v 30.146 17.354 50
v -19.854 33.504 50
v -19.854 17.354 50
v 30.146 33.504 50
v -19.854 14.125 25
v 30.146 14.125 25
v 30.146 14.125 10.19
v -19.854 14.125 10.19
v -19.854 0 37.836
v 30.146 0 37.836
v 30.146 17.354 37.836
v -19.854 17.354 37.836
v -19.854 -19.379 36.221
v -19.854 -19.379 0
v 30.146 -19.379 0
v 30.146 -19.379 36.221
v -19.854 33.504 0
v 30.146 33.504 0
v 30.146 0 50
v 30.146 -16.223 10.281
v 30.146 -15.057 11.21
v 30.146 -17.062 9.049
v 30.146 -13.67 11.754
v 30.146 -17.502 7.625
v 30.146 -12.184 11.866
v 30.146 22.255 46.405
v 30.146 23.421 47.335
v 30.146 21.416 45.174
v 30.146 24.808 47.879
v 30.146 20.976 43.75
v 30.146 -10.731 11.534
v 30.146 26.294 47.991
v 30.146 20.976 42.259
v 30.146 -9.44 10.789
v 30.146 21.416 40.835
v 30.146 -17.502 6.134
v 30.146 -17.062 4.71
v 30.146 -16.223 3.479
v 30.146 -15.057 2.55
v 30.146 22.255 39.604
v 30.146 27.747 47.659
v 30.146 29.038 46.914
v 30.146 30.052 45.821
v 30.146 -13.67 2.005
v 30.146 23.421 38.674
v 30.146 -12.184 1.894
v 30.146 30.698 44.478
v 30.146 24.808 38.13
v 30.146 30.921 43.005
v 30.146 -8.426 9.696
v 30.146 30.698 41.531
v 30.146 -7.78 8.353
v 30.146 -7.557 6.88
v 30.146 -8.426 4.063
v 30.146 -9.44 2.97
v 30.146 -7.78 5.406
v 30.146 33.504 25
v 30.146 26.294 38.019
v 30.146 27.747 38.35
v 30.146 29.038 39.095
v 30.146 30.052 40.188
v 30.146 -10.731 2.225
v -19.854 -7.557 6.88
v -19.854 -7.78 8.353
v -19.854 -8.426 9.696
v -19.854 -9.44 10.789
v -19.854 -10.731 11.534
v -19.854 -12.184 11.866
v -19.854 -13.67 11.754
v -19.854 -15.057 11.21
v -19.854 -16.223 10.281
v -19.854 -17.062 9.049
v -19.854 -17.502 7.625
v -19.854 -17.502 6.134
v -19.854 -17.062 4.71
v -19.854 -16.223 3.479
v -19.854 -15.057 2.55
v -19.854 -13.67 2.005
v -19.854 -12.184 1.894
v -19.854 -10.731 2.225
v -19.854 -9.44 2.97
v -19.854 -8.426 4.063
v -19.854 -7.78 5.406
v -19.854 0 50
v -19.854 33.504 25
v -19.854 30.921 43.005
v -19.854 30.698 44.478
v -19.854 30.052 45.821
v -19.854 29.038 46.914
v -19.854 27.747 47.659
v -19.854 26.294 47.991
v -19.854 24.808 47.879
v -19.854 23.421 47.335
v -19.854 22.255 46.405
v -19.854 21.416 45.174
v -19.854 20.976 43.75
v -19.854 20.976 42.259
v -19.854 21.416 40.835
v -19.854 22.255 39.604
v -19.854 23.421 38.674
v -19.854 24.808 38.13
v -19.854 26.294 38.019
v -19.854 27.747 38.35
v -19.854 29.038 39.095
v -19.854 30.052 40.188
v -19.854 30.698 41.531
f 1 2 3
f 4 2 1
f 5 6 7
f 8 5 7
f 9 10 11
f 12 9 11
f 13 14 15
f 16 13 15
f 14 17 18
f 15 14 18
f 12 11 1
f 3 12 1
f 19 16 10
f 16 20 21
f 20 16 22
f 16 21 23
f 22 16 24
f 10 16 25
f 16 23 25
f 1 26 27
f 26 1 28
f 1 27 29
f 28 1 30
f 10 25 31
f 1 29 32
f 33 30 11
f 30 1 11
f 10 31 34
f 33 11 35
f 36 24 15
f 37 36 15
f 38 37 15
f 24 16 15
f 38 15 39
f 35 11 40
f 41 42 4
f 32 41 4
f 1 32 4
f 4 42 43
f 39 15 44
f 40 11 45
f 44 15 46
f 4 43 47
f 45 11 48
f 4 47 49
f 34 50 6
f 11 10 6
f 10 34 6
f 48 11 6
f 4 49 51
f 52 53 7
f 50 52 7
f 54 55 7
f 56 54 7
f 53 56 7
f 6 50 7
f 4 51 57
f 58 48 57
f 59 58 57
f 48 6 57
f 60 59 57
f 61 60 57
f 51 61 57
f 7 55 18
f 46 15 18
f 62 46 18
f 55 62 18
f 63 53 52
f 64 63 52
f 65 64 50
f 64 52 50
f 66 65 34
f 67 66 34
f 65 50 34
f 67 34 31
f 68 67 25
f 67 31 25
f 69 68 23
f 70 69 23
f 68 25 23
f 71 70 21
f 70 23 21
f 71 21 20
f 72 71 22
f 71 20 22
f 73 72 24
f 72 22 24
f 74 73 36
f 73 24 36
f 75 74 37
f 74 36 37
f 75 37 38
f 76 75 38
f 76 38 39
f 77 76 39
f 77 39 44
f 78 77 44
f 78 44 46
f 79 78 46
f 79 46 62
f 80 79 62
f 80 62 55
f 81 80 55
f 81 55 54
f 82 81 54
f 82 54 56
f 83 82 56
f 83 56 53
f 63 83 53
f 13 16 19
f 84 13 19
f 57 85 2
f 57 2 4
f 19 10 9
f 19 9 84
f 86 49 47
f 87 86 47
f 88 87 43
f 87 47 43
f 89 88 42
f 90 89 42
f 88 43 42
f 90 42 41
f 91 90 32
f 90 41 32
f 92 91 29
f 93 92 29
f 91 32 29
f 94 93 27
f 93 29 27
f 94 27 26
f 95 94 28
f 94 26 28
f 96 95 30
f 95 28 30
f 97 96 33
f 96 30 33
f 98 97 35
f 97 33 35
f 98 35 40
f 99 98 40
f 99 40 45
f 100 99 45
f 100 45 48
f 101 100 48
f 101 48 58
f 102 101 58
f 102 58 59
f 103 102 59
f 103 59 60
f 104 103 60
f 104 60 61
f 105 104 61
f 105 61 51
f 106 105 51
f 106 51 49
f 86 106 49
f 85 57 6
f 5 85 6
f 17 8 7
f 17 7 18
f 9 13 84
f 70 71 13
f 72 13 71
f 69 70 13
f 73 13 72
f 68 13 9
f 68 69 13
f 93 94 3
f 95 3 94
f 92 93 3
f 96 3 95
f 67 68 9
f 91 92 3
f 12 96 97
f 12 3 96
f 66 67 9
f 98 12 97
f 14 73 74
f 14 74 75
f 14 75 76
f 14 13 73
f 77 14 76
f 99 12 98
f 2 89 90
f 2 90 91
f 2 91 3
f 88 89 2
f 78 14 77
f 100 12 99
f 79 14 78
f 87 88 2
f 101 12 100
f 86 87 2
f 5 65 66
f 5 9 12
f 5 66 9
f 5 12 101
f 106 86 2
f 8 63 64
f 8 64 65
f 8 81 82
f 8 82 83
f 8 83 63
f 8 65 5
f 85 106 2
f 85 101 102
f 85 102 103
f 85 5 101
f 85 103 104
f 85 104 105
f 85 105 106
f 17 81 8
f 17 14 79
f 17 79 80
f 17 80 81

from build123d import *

# Parameters (mm, degrees)
F0_W     = 50
F0_H     = 52.8824854079
F1_DEPTH = 50
F3_DEPTH = 50
F4_R     = 5
F5_DEPTH = 50.001
F6_W     = 17.3539984971
F6_H     = 12.1642492712
F7_DEPTH = 50.001


with BuildPart() as f1:
    # F0 (on Top) → F1 (new body)
    with BuildSketch(Plane.XY):
        with Locations((5.1456615329, 7.0626717061)):
            Rectangle(F0_W, F0_H)
    extrude(amount=F1_DEPTH)

    # F2 (on face) → F3 (cut)
    with BuildSketch(Plane.YZ.offset(30.1456615329)):
        Polygon((-19.3785709979, 50), (-19.3785709979, 36.2214259803), (0, 50), align=None)
    extrude(amount=-F3_DEPTH, mode=Mode.SUBTRACT)

    # F4 (on face) → F5 (cut, through all)
    with BuildSketch(Plane.YZ.offset(30.1456615329)):
        with Locations((-12.5574155126, 6.8796549415)):
            Circle(F4_R)
        with Locations((25.9205371111, 43.0046210508)):
            Circle(F4_R)
    extrude(amount=-F5_DEPTH, mode=Mode.SUBTRACT)

    # F6 (on face) → F7 (cut, through all)
    with BuildSketch(Plane.YZ.offset(30.1456615329)):
        Polygon((33.50391441, 0), (33.50391441, 25), (14.1253471375, 25), (14.1253471375, 10.190429166), align=None)
        with Locations((8.6769992486, 43.9178753644)):
            Rectangle(F6_W, F6_H)
    extrude(amount=-F7_DEPTH, mode=Mode.SUBTRACT)


solid = f1.part
